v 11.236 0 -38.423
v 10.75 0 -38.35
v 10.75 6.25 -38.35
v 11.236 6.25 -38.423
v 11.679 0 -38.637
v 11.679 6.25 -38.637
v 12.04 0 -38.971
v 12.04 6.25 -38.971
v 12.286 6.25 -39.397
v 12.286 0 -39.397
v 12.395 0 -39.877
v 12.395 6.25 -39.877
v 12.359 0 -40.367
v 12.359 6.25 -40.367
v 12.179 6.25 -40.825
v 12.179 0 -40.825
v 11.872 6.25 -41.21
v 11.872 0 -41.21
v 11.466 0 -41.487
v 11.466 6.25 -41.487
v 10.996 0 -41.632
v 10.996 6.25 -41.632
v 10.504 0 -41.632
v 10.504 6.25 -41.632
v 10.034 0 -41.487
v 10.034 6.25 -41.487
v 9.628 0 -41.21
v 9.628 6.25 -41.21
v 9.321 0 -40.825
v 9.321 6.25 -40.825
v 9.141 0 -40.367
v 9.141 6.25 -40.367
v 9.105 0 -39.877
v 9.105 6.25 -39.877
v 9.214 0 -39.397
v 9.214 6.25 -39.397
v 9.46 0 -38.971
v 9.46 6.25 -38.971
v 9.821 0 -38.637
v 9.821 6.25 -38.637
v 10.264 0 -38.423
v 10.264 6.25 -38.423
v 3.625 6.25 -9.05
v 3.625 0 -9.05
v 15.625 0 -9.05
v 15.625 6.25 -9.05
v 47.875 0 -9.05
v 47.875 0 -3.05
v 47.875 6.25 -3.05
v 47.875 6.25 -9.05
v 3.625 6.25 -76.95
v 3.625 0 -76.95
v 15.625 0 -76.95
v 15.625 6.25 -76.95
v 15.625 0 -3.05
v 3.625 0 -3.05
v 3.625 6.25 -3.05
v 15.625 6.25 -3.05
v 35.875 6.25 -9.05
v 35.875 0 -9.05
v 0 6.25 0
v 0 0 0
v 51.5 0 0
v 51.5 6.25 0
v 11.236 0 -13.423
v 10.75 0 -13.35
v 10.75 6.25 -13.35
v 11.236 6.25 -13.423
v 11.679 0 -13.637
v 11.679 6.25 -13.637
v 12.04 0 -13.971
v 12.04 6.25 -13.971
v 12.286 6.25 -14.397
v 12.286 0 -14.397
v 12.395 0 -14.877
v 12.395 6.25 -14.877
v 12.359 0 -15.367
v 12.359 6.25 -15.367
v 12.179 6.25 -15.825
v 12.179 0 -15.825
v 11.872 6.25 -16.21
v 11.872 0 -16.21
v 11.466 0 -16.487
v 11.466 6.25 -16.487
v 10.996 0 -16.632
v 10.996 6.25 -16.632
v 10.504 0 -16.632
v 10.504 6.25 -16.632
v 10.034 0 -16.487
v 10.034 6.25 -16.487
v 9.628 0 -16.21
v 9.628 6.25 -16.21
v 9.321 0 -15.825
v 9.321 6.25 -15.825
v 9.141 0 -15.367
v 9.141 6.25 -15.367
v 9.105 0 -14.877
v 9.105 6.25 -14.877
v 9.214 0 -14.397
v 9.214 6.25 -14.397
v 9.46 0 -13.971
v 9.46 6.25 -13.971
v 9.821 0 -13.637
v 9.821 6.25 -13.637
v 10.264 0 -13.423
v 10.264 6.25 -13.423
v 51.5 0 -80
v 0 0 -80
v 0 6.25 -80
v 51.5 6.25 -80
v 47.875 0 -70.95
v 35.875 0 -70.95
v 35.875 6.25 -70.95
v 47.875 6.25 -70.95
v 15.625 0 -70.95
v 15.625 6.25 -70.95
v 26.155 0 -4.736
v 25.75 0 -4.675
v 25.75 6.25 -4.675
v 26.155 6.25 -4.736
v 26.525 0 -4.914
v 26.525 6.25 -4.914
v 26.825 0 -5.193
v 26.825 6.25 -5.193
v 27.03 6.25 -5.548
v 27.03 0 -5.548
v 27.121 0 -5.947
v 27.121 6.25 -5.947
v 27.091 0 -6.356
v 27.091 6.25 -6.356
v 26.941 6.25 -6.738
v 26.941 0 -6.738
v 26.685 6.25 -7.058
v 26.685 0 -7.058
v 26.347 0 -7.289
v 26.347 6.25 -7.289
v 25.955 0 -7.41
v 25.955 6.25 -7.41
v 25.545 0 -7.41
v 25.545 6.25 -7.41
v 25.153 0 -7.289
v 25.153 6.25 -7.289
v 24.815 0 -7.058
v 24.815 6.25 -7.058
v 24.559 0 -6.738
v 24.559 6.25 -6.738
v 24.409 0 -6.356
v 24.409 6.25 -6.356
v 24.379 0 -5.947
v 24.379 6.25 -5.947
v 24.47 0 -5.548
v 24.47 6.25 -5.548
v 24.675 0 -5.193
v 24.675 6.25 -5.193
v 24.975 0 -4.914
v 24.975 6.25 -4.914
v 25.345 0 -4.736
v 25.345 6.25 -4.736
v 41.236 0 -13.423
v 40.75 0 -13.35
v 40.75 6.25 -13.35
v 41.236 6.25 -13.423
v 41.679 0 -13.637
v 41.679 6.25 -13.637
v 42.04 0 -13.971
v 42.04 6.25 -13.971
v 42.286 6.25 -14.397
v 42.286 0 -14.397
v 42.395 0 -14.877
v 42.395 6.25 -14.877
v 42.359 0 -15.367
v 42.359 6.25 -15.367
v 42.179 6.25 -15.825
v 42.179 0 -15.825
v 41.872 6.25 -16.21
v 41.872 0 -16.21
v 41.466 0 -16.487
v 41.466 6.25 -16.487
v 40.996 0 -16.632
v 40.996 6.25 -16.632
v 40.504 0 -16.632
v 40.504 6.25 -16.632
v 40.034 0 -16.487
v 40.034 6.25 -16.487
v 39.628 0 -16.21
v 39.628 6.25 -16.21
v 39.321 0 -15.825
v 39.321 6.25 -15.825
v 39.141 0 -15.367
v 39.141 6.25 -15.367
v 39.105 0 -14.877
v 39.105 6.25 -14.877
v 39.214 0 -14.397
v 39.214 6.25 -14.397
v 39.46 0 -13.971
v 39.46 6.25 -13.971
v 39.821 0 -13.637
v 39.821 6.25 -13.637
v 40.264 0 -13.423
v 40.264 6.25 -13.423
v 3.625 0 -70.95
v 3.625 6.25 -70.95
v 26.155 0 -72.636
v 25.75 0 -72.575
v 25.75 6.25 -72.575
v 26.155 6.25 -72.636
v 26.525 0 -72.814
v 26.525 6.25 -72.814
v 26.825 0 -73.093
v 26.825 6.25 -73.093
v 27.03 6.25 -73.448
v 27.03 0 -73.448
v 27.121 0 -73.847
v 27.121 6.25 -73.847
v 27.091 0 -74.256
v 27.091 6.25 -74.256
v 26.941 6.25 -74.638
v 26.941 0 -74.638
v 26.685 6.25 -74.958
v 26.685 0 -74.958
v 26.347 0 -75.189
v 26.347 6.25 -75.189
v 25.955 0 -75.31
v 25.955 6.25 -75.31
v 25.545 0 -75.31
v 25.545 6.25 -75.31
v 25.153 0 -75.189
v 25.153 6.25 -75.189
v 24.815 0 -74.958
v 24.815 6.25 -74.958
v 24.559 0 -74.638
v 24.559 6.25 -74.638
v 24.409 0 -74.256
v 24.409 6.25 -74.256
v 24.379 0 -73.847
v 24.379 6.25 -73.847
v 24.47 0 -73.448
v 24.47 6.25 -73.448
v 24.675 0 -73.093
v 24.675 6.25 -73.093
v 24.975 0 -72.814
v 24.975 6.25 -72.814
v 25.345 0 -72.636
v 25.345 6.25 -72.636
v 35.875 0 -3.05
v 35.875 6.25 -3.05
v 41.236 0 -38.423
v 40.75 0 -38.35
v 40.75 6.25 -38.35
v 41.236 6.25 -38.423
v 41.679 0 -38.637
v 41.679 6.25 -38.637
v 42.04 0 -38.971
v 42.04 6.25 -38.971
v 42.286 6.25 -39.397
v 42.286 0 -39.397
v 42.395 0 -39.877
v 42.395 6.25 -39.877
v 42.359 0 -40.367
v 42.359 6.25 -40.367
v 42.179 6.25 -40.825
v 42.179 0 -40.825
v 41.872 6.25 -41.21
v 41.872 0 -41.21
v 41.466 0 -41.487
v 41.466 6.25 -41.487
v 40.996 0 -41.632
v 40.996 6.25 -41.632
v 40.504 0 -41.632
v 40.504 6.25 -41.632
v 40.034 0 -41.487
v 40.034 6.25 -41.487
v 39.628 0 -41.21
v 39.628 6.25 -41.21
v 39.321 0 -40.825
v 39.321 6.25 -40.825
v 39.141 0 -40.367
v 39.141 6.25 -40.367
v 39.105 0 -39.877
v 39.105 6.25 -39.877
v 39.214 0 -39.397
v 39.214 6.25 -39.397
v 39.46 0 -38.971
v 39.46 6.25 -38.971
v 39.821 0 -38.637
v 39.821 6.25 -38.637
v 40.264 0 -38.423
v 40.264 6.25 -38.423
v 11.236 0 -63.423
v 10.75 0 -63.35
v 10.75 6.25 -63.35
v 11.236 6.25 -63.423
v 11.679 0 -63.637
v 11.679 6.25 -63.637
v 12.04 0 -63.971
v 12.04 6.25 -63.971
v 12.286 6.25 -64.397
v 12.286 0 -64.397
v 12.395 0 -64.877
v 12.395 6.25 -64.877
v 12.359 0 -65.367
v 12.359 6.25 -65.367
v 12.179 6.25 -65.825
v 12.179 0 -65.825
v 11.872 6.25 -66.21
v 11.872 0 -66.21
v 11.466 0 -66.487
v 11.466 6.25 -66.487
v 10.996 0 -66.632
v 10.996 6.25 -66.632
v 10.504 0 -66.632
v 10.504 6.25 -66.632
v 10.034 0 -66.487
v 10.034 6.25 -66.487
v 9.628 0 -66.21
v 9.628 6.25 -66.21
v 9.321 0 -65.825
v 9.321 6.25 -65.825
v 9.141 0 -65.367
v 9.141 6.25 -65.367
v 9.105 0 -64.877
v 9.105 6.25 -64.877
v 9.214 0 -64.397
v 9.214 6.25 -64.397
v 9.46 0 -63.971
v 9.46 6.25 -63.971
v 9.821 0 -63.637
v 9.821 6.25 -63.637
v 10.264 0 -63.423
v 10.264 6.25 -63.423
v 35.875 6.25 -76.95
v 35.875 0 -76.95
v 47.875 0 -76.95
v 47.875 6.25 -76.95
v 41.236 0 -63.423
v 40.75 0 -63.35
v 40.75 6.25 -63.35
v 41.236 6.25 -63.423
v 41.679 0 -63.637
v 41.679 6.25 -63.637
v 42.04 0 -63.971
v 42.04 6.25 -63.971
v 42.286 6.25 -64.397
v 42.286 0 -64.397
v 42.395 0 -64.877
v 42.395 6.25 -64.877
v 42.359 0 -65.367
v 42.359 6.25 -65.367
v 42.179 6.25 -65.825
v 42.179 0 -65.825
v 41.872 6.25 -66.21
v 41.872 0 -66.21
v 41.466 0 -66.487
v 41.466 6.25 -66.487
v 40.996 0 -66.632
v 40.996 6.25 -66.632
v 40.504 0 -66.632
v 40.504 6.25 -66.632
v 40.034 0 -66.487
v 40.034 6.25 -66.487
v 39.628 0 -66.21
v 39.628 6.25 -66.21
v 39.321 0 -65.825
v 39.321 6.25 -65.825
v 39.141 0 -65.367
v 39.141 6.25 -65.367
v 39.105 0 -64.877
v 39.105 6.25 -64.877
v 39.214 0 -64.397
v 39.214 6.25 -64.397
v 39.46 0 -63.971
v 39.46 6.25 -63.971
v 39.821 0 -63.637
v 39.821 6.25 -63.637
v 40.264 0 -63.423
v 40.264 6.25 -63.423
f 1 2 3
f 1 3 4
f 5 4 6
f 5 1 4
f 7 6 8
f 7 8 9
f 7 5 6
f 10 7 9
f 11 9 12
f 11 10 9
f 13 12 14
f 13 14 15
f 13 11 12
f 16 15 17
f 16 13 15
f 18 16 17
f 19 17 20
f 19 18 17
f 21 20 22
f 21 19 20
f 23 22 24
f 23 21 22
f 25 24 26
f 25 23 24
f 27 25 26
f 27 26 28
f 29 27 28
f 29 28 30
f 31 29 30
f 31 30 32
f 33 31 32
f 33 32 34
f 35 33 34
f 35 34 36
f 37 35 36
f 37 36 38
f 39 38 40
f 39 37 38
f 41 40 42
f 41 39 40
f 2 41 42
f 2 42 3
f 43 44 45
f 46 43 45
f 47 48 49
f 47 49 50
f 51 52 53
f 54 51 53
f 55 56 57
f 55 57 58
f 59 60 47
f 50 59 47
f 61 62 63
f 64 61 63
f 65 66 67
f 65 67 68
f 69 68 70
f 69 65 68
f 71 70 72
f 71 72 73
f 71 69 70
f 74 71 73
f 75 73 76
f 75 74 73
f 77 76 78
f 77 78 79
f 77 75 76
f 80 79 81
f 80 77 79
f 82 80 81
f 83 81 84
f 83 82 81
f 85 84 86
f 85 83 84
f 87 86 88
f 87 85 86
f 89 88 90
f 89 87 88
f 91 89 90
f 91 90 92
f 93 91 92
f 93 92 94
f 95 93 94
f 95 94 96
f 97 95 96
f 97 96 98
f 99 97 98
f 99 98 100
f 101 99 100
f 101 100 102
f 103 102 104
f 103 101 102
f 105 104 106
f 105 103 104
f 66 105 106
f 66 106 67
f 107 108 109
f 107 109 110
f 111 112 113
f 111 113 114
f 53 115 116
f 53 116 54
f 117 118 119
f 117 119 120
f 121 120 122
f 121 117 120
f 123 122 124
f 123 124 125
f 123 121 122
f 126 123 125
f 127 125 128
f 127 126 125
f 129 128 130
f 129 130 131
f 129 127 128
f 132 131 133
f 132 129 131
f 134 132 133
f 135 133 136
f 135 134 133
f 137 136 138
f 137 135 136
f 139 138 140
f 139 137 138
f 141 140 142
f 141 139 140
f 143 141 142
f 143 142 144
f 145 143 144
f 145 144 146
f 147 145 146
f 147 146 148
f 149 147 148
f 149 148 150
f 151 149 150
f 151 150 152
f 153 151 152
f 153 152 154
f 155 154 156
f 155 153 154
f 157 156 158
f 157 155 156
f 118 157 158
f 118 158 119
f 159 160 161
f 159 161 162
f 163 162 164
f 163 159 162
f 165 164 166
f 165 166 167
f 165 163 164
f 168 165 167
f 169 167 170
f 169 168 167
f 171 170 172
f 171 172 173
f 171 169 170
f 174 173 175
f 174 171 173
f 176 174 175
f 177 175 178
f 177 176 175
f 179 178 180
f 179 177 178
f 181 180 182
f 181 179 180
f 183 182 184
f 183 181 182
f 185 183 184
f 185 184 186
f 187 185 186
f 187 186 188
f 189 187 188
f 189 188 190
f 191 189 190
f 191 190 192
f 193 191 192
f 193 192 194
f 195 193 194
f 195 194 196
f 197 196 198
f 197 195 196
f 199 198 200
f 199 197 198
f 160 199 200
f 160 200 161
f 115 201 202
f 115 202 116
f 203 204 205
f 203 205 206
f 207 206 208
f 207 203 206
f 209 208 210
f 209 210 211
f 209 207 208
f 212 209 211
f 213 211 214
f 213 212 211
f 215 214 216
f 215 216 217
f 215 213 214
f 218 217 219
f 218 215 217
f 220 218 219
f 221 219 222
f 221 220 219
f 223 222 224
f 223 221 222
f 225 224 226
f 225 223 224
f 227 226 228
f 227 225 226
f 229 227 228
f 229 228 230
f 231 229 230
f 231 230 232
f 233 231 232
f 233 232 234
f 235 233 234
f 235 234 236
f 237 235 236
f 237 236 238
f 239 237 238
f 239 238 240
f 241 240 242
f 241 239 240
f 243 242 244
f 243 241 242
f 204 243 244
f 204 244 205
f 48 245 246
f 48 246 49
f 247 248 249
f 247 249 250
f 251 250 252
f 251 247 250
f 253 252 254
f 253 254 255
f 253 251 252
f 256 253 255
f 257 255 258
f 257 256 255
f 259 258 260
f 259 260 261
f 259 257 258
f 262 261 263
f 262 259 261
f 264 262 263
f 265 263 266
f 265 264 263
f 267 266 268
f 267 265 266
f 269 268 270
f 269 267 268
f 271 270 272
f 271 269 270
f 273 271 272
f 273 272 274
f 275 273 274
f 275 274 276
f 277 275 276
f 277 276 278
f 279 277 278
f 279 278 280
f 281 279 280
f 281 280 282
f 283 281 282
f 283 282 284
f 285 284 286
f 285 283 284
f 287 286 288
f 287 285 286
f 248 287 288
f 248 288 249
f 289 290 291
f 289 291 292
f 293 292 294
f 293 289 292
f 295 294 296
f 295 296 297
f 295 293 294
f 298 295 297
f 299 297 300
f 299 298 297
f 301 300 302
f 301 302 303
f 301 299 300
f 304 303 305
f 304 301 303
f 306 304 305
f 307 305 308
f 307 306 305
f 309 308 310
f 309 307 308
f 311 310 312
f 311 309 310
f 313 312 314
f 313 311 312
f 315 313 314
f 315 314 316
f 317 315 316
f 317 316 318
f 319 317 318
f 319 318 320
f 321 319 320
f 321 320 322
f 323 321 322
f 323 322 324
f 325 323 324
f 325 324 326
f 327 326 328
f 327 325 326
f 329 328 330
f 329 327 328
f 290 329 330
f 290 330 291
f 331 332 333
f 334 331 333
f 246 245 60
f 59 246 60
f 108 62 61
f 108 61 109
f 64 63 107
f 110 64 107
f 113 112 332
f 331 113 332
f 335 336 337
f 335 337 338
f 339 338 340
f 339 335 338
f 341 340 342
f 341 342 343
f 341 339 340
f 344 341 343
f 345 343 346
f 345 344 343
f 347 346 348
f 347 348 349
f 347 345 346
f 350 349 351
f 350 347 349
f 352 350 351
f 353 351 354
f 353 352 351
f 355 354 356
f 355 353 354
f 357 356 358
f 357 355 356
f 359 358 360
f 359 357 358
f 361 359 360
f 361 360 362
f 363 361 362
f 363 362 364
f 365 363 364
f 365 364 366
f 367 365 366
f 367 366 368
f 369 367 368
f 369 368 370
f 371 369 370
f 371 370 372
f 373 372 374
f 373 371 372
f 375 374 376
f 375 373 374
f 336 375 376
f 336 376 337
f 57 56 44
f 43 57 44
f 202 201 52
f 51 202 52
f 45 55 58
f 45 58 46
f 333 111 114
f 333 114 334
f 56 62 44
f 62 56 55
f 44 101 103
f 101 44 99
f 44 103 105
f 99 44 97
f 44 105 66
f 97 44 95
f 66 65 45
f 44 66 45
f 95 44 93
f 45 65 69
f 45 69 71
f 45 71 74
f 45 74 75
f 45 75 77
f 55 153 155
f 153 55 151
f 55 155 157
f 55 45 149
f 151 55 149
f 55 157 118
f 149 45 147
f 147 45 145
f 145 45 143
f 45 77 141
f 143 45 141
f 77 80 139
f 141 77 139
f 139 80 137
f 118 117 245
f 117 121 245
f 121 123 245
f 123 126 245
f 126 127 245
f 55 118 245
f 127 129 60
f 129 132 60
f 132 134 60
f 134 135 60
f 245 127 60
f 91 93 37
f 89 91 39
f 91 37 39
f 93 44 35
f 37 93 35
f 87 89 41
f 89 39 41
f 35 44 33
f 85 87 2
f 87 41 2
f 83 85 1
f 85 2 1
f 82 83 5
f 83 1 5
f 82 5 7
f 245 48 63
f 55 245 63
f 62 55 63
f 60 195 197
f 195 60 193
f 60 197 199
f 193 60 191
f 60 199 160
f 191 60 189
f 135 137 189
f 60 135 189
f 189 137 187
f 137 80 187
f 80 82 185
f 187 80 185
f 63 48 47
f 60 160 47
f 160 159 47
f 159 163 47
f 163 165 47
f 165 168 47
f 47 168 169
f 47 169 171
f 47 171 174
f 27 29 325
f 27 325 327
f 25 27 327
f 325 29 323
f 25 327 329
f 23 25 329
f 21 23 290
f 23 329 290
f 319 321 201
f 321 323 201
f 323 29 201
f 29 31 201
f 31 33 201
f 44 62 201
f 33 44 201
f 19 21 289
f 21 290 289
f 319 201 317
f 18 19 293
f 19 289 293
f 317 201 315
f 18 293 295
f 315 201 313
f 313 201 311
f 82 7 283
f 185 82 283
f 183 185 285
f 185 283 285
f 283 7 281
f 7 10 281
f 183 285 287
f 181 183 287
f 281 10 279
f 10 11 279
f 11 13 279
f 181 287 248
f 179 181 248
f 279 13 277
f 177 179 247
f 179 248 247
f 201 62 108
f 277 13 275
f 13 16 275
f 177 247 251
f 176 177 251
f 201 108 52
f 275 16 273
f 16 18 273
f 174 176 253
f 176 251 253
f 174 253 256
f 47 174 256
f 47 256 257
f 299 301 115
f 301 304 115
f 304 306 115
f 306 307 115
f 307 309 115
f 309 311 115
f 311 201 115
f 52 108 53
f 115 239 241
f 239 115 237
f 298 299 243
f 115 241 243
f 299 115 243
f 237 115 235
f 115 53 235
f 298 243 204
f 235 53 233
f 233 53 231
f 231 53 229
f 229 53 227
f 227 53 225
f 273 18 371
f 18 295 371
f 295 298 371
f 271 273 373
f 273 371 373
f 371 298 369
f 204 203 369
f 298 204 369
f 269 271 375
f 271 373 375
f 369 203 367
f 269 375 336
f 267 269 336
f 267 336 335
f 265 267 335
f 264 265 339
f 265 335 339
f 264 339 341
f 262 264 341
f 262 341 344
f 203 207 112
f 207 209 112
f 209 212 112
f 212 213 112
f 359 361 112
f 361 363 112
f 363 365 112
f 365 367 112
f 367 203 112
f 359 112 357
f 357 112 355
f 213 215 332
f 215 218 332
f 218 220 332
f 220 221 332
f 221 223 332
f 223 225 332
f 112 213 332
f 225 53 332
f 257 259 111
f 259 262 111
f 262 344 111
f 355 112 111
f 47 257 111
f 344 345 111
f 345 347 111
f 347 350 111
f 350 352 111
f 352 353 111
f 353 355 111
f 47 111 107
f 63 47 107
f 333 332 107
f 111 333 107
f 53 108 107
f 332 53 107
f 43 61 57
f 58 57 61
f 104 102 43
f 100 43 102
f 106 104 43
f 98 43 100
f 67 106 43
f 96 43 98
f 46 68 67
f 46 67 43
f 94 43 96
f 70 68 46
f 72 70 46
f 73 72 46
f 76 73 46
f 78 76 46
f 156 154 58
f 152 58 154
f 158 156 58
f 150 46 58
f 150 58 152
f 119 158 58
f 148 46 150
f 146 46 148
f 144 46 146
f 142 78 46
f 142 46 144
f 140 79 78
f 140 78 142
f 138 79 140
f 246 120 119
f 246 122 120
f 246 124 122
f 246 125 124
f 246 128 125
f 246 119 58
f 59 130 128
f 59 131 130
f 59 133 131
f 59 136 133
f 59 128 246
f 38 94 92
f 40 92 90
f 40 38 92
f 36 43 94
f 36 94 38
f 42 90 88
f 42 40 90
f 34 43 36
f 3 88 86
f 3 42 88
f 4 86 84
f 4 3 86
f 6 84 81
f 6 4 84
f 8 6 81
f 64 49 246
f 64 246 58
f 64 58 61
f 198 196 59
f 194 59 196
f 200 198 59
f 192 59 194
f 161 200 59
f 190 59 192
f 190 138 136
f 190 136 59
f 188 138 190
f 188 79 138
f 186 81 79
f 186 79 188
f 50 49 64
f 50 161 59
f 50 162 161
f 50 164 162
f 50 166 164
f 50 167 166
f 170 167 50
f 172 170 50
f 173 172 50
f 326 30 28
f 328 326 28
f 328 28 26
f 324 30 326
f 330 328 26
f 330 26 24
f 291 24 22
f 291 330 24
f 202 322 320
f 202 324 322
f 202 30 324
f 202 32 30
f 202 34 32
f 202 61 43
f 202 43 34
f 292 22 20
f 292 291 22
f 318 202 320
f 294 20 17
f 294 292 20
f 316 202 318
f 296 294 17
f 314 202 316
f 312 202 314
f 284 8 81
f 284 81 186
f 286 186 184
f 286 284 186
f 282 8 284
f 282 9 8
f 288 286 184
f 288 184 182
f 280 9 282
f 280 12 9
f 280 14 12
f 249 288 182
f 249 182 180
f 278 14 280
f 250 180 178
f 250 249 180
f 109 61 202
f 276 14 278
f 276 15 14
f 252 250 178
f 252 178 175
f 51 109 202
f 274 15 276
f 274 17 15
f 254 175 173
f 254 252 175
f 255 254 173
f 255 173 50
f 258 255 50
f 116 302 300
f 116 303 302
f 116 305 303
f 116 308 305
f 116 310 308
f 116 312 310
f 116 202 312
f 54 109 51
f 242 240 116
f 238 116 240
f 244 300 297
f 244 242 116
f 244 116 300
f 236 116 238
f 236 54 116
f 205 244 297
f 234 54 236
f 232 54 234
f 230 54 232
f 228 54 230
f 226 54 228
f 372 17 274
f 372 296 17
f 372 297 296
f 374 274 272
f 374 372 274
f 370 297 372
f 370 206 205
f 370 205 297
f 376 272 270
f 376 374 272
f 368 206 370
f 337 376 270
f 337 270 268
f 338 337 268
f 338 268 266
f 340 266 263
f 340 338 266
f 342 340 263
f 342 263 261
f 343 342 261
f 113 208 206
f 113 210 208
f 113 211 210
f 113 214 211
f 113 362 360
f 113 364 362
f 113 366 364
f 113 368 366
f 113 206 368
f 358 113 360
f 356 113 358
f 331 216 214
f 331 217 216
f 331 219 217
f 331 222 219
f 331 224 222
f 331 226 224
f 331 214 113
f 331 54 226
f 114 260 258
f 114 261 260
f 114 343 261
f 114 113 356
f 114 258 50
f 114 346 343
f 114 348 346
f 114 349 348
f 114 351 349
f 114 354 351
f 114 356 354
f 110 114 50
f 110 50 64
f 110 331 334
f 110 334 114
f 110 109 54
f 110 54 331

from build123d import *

# Parameters (mm, degrees)
SKETCH1_W           = 51.5
SKETCH1_H           = 80
SKETCH1_R           = 1.65
SKETCH1_R_2         = 1.375
SKETCH1_W_2         = 12
SKETCH1_H_2         = 6
BOSS_EXTRUDE1_DEPTH = 6.25


with BuildPart() as part:
    # Sketch1 → Boss-Extrude1 (new body)
    with BuildSketch(Plane(origin=(0, 0, 0), x_dir=(1, 0, 0), z_dir=(0, 1, 0))):
        with Locations((25.75, 40)):
            Rectangle(SKETCH1_W, SKETCH1_H)
        with Locations(Location((10.75, 15, 0), (0, 0, 270))):
            Circle(SKETCH1_R, mode=Mode.SUBTRACT)
        with Locations(Location((40.75, 15, 0), (0, 0, 270))):
            Circle(SKETCH1_R, mode=Mode.SUBTRACT)
        with Locations(Location((25.75, 73.95, 0), (0, 0, 270))):
            Circle(SKETCH1_R_2, mode=Mode.SUBTRACT)
        with Locations(Location((40.75, 40, 0), (0, 0, 270))):
            Circle(SKETCH1_R, mode=Mode.SUBTRACT)
        with Locations(Location((25.75, 6.05, 0), (0, 0, 270))):
            Circle(SKETCH1_R_2, mode=Mode.SUBTRACT)
        with Locations(Location((40.75, 65, 0), (0, 0, 270))):
            Circle(SKETCH1_R, mode=Mode.SUBTRACT)
        with Locations(Location((10.75, 40, 0), (0, 0, 270))):
            Circle(SKETCH1_R, mode=Mode.SUBTRACT)
        with Locations(Location((10.75, 65, 0), (0, 0, 270))):
            Circle(SKETCH1_R, mode=Mode.SUBTRACT)
        with Locations((41.875, 73.95)):
            Rectangle(SKETCH1_W_2, SKETCH1_H_2, mode=Mode.SUBTRACT)
        with Locations((41.875, 6.05)):
            Rectangle(SKETCH1_W_2, SKETCH1_H_2, mode=Mode.SUBTRACT)
        with Locations((9.625, 6.05)):
            Rectangle(SKETCH1_W_2, SKETCH1_H_2, mode=Mode.SUBTRACT)
        with Locations((9.625, 73.95)):
            Rectangle(SKETCH1_W_2, SKETCH1_H_2, mode=Mode.SUBTRACT)
    extrude(amount=BOSS_EXTRUDE1_DEPTH)


solid = part.part
